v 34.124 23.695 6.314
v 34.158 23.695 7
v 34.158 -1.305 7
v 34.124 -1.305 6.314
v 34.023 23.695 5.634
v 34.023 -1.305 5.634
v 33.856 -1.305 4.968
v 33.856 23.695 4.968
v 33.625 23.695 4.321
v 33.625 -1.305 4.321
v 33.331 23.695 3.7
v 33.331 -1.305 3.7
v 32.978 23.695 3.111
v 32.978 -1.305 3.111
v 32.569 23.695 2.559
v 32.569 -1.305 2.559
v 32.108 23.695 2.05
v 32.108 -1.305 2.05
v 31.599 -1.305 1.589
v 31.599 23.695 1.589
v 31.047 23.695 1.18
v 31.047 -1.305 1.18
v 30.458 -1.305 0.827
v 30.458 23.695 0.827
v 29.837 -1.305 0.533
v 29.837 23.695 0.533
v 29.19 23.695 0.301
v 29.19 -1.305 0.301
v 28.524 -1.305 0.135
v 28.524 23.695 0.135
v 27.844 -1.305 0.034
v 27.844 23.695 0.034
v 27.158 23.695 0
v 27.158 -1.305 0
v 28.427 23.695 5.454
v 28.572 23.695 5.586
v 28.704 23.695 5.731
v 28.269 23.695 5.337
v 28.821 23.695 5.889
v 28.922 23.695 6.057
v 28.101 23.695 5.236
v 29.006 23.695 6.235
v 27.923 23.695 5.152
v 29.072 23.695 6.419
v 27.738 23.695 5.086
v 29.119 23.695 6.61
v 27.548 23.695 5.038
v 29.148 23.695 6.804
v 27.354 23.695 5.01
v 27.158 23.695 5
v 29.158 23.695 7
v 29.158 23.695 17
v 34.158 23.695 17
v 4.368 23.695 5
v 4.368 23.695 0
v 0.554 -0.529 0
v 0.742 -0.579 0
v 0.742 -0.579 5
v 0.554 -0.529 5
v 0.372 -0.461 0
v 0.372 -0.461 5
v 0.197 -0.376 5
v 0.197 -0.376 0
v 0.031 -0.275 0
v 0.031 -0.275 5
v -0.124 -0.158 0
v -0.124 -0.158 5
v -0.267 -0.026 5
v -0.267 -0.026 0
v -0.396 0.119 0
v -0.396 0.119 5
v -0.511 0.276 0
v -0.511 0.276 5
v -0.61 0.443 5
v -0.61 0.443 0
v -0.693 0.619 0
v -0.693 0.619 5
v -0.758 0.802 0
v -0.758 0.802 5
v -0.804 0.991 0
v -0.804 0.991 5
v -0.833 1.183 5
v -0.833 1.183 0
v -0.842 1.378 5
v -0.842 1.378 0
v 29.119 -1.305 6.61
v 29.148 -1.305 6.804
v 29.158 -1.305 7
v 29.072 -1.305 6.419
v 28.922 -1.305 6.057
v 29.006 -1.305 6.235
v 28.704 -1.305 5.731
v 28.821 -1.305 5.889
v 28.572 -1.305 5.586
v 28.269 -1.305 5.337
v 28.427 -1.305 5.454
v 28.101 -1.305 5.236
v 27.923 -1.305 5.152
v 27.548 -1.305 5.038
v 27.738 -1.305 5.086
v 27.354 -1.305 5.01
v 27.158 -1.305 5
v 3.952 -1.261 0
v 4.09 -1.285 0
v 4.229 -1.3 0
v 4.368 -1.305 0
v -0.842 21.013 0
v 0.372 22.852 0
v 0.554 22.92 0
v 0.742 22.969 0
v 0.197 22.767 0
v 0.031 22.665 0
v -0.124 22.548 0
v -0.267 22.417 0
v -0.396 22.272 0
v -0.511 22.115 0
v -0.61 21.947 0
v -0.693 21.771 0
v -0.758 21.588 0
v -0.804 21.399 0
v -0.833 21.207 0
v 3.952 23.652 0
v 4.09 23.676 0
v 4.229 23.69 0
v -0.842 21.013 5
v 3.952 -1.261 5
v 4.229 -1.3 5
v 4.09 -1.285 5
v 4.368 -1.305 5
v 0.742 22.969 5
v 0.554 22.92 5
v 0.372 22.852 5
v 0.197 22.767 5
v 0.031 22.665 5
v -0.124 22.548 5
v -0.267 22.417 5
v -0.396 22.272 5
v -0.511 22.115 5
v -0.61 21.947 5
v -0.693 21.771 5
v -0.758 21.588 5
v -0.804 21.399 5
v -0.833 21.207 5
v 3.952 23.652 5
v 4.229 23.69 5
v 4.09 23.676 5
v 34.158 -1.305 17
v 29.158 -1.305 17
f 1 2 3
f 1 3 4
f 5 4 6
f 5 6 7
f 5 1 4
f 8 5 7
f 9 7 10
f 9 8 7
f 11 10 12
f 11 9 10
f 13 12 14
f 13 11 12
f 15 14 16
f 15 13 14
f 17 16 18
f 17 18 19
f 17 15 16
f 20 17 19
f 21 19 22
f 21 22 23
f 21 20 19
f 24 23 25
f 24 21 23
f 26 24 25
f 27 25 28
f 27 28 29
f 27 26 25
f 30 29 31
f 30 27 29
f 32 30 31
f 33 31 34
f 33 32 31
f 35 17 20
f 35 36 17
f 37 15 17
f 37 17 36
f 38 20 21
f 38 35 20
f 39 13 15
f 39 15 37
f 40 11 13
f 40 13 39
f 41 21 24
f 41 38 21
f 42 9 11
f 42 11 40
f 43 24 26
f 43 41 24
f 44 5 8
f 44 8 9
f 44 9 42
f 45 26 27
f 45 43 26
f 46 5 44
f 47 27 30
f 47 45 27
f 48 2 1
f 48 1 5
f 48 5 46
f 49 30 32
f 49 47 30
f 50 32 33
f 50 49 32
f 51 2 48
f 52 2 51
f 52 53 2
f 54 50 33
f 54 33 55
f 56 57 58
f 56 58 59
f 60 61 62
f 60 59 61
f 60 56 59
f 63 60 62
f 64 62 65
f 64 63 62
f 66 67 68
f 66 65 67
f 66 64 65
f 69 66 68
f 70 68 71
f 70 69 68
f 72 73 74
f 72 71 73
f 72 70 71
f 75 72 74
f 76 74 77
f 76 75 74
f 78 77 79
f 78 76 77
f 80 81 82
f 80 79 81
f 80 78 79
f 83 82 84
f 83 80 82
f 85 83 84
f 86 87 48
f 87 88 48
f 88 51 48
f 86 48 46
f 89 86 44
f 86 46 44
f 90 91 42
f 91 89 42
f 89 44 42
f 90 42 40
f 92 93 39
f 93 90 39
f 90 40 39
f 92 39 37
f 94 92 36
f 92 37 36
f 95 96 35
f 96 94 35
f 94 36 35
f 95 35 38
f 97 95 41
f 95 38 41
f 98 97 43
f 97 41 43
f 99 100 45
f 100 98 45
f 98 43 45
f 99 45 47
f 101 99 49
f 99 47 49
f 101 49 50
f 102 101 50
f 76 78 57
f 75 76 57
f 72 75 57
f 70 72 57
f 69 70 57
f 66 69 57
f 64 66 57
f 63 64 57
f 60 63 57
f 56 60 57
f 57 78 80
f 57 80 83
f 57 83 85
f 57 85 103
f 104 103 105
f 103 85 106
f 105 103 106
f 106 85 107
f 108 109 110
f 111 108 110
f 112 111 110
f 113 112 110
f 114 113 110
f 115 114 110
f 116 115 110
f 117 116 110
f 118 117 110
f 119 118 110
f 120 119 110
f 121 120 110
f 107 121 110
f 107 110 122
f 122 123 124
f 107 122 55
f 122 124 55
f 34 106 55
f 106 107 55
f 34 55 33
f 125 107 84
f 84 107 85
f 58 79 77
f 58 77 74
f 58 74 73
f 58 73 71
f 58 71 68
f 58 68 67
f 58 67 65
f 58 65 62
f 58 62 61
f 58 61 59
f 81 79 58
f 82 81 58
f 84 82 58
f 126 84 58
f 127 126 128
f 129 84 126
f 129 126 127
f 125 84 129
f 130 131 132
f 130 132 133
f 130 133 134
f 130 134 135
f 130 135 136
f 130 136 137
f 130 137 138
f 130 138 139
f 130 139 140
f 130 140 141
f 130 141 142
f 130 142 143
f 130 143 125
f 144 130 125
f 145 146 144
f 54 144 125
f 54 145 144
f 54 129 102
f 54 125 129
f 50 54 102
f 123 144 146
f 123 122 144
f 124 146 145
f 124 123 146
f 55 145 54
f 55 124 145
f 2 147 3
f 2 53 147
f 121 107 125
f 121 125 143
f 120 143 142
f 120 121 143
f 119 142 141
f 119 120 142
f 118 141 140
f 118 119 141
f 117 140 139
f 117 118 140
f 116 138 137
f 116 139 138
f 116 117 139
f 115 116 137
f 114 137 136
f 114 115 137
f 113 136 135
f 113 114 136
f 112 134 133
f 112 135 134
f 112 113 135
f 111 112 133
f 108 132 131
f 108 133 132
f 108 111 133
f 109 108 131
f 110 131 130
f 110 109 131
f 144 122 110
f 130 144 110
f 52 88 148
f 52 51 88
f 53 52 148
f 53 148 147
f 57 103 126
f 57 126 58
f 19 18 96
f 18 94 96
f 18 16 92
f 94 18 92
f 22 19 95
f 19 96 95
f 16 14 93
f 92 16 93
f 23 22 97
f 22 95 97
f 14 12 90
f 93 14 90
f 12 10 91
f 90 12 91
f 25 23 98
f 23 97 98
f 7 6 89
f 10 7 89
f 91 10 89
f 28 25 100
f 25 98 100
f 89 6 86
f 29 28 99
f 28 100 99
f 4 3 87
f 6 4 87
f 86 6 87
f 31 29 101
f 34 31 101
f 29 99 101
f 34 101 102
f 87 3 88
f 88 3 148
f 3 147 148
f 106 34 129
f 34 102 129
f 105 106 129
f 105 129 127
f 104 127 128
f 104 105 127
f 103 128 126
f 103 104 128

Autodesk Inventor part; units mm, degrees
ref_plane "YZ Plane" through (0, 0, 0) normal (1, 0, 0) x (0, 1, 0)
ref_plane "XZ Plane" through (0, 0, 0) normal (0, 1, 0) x (-1, 0, 0)
ref_plane "XY Plane" through (0, 0, 0) normal (0, 0, 1) x (1, 0, 0)
sketch "Sketch1" plane through (0, 0, 0) normal (0, 0, 1) x (1, 0, 0)
  line L0 (4.3681, -1.3047) -> (34.1579, -1.3047)
  line L1 (34.1579, -1.3047) -> (34.1579, 23.6953)
  line L2 (34.1579, 23.6953) -> (4.3681, 23.6953)
  line L3 (-0.8421, 21.0129) -> (-0.8421, 1.3776)
  line L4 (3.9523, 23.6516) -> (0.7421, 22.9692)
  line L5 (3.9523, -1.261) -> (0.7421, -0.5787)
  line L6 (4.1579, 23.6953) -> (4.1579, -1.3047) construction
  arc A0 (0.7421, 22.9692) -> (-0.8421, 21.0129) centre (1.1579, 21.0129) ccw
  arc A1 (-0.8421, 1.3776) -> (0.7421, -0.5787) centre (1.1579, 1.3776) ccw
  arc A2 (4.3681, 23.6953) -> (3.9523, 23.6516) centre (4.3681, 21.6953) ccw
  arc A3 (3.9523, -1.261) -> (4.3681, -1.3047) centre (4.3681, 0.6953) ccw
  point P0 (0, 0)
  point P1 (-0.8421, 22.6325)
  point P2 (-0.8421, -0.242)
  dimension "d3" = 12
  dimension "d4" = 25
  dimension "d5" = 12
  dimension "d7" = 35
  dimension "d8" = 5
  dimension "d20" = 2
extrude "Plate1" add sketch "Sketch1" along normal blind 5
sketch "Sketch2" plane through (29.1579, 23.6953, 0) normal (1, 0, 0) x (0, 1, 0)
  line L0 (-25, 0) -> (0, 0)
  line L1 (0, 0) -> (0, 17)
  line L2 (0, 17) -> (-25, 17)
  line L3 (-25, 17) -> (-25, 0)
edge flange "Flange1" height 12 angle 90 thickness 5 bend radius 2 thickness toward (1, 0, 0) relief tear relief width 5 relief depth 2.5 edges at (34.1579, 11.1953, 5) wall of the first edge with corners at (29.1579, -1.3047, 0) (29.1579, 23.6953, 0) (29.1579, 23.6953, 17) (29.1579, -1.3047, 17)
bend "Bend1"
corner "Corner1"
ref_plane "midtplan" through (4.3681, 11.1953, 5) normal (0, 1, 0) x (1, 0, 0)
equation "\"d3\" = d5"
equation "\"d9\" = Thickness"
equation "\"d10\" = BendReliefWidth"
equation "\"d11\" = BendReliefDepth"
equation "\"d12\" = MinimumRemnant"
equation "\"d13\" = TransitionRadius"
equation "\"d16\" = BendRadius"
equation "\"d17\" = CornerReliefSize"
equation "\"d18\" = GapSize"
equation "\"d19\" = JacobiRadiusSize"
equation "\"BendReliefWidth\" = Thickness"
equation "\"BendReliefDepth\" = 0.5 * Thickness"
equation "\"TransitionRadius\" = BendRadius"
equation "\"JacobiRadiusSize\" = BendRadius"
equation "\"GapSize\" = Thickness"
equation "\"Thickness\" = 5"
equation "\"MinimumRemnant\" = 10"
equation "\"BendRadius\" = 2"
equation "\"CornerReliefSize\" = 20"
properties part number "hage" material "Steel"
